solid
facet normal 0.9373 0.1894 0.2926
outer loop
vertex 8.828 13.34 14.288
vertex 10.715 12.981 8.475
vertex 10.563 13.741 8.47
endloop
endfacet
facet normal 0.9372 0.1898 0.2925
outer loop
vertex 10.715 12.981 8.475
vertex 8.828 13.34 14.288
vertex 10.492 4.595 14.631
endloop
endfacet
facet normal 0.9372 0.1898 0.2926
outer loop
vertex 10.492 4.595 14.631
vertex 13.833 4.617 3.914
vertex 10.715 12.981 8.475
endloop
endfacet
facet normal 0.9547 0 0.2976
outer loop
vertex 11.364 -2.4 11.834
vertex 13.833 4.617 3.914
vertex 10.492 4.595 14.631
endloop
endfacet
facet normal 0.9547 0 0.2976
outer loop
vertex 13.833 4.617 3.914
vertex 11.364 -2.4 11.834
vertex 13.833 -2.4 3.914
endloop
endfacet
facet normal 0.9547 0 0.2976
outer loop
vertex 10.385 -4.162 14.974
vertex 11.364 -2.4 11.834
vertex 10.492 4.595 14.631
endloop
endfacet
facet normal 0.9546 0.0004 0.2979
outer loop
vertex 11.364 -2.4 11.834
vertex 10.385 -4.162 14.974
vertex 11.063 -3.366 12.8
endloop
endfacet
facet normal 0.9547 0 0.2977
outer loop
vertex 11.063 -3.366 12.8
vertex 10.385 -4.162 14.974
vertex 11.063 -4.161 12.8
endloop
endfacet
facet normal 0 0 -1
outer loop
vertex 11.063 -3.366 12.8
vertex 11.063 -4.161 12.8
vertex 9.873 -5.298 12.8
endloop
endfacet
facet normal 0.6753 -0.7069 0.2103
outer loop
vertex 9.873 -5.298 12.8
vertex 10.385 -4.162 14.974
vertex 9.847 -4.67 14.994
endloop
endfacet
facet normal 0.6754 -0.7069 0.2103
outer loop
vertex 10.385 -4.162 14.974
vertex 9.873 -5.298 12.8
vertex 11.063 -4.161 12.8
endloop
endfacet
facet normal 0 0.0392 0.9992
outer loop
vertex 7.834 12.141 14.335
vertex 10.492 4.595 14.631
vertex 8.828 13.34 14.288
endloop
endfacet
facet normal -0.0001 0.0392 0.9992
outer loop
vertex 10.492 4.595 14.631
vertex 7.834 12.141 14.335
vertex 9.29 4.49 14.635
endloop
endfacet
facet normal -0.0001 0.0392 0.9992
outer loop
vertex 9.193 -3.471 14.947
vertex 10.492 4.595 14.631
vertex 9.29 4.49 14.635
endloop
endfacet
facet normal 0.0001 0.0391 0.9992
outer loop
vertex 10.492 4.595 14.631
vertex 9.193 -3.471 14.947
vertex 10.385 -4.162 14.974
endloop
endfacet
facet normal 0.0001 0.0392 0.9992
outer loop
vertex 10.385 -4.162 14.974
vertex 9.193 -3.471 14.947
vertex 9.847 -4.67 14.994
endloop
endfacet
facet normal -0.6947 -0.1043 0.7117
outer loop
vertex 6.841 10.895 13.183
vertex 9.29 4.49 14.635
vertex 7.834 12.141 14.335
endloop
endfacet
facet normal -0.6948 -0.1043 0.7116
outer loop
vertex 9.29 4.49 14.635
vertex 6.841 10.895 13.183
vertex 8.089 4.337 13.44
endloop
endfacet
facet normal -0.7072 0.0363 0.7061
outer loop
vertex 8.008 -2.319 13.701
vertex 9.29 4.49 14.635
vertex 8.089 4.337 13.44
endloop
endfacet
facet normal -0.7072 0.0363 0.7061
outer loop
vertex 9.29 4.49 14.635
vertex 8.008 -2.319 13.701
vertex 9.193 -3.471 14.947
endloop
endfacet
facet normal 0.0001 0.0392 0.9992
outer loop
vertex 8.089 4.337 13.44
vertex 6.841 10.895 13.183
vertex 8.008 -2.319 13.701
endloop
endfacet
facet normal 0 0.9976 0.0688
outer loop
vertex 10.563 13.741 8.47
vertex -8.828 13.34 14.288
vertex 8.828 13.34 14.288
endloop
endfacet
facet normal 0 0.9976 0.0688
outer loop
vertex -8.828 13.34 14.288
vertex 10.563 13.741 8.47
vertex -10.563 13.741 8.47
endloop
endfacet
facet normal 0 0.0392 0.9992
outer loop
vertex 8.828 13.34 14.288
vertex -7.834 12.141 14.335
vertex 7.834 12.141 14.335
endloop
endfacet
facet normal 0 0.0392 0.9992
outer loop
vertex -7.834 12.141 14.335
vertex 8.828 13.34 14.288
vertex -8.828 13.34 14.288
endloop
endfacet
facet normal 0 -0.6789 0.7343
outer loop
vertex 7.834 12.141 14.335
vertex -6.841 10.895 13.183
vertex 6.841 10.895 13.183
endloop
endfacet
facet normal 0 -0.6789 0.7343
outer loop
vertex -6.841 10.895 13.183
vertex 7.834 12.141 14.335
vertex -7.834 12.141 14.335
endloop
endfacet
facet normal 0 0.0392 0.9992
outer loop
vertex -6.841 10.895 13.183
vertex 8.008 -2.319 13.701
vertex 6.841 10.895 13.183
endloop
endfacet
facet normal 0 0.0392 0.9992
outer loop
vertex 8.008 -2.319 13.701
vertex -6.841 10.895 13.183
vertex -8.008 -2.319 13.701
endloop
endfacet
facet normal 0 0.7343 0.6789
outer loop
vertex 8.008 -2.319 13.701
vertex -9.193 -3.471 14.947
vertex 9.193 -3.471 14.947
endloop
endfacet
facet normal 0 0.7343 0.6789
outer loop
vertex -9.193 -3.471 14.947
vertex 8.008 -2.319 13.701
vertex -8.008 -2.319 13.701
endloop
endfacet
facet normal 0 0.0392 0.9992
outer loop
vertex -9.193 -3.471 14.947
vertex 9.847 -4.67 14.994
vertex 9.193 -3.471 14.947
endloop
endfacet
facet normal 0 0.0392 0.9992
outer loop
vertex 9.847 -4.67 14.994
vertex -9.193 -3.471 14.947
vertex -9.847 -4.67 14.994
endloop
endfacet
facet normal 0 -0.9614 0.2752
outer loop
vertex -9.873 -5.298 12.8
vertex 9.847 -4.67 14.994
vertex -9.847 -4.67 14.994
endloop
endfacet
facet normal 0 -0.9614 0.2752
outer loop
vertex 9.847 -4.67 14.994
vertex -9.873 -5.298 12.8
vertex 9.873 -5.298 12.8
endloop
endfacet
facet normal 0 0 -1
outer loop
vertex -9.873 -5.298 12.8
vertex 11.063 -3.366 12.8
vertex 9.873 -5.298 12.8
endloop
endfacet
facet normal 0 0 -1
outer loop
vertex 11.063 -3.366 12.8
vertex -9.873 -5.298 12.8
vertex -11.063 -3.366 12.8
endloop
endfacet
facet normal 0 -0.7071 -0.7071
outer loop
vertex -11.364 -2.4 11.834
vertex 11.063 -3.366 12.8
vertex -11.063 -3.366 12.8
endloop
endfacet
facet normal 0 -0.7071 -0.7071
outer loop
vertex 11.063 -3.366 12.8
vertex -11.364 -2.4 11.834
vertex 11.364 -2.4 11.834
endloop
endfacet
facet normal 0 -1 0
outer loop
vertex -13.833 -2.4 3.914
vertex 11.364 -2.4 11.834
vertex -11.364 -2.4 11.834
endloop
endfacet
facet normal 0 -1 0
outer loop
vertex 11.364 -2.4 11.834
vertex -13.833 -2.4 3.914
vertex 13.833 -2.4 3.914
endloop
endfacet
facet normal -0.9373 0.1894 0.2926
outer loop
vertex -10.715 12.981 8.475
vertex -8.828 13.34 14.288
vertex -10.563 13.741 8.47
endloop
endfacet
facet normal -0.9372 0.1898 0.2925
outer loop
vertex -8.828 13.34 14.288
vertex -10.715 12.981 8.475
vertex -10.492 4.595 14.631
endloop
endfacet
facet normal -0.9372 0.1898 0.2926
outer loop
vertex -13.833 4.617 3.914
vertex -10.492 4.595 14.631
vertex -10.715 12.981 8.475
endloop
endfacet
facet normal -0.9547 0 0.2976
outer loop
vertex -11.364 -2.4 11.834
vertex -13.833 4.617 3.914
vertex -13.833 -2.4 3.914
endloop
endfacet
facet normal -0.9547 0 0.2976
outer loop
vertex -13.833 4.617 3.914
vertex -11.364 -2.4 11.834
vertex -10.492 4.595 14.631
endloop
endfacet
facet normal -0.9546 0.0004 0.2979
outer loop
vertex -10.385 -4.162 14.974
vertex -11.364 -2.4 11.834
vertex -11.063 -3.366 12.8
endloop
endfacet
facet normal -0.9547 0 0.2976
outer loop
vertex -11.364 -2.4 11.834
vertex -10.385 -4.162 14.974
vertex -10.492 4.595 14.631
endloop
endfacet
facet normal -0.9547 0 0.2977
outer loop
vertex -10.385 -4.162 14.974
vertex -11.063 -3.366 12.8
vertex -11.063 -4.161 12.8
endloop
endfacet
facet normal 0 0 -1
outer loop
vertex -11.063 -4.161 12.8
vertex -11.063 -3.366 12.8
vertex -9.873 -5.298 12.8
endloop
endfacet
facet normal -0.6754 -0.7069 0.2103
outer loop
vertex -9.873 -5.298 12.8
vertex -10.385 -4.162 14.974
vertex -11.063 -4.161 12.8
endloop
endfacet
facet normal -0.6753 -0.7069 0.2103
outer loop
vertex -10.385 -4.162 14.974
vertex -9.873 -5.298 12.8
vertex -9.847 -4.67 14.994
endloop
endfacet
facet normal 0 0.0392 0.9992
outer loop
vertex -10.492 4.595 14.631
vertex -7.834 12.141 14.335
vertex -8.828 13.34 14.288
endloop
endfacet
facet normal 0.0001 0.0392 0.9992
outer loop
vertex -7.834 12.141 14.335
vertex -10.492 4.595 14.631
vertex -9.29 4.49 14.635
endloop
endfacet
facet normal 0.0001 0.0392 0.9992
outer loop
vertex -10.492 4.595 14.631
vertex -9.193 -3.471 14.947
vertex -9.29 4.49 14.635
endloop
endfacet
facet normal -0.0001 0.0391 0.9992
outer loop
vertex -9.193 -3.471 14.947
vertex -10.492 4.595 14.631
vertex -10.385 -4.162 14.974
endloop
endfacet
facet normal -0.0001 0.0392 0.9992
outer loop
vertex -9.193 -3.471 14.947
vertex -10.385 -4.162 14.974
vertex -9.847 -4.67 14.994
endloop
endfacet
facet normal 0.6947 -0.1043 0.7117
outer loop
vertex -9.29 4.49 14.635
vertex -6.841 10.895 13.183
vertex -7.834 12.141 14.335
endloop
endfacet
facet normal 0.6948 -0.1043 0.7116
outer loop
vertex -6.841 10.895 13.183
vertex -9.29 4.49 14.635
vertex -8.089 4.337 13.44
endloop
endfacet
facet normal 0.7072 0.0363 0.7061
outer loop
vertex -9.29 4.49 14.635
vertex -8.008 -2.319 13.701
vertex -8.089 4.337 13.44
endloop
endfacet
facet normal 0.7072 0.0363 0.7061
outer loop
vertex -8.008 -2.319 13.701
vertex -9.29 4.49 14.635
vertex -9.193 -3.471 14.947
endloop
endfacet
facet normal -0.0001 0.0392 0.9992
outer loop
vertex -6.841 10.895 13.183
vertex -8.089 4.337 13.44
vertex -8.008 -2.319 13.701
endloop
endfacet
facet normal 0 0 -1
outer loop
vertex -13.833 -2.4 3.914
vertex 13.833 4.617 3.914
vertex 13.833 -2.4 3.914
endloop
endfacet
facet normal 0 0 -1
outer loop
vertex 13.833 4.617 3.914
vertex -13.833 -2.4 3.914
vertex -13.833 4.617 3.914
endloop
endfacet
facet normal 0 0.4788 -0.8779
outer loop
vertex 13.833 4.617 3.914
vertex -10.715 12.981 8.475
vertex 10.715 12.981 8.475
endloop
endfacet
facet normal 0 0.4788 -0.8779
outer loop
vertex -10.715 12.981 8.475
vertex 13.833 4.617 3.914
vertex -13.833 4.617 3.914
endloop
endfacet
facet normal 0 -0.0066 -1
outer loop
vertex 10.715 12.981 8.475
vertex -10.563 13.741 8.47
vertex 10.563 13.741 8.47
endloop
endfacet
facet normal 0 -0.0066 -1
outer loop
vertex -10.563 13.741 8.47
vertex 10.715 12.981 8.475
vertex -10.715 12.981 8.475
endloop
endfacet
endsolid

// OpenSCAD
use <../lib.scad>
function ldraw_lib__15435() = [
// 0 ~Minifig Helmet Large Square - Top
// 0 Name: 15435.dat
// 0 Author: Magnus Forsberg [MagFors]
// 0 !LDRAW_ORG Part UPDATE 2024-03
// 0 !LICENSE Licensed under CC BY 4.0 : see CAreadme.txt
// 
// 0 BFC CERTIFY CCW
  [0,"BFC","CERTIFY"],
  [0,"BFC","CCW"],
// 
// 0 !HISTORY 2024-04-28 [OrionP] Official Update 2024-03
// 
// 0 // side
// 4 16 26.2294 -36.577 11.4883 26.7885 -21.1873 32.4533 26.4076 -21.175 34.3532 22.0694 -35.72 33.35
  [4,16,26.2294,-36.577,11.4883,26.7885,-21.1873,32.4533,26.4076,-21.175,34.3532,22.0694,-35.72,33.35],
// 3 16 26.2294 -36.577 11.4883 34.5836 -9.785 11.5429 26.7885 -21.1873 32.4533
  [3,16,26.2294,-36.577,11.4883,34.5836,-9.785,11.5429,26.7885,-21.1873,32.4533],
// 4 16 26.2294 -36.577 11.4883 28.4096 -29.585 -6 34.5836 -9.785 -6 34.5836 -9.785 11.5429
  [4,16,26.2294,-36.577,11.4883,28.4096,-29.585,-6,34.5836,-9.785,-6,34.5836,-9.785,11.5429],
// 4 16 27.6566 -32 -8.415 28.4096 -29.585 -6 26.2294 -36.577 11.4883 25.9618 -37.4353 -10.4053
  [4,16,27.6566,-32,-8.415,28.4096,-29.585,-6,26.2294,-36.577,11.4883,25.9618,-37.4353,-10.4053],
// 3 16 27.6566 -32 -8.415 25.9618 -37.4353 -10.4053 27.6566 -32 -10.4017
  [3,16,27.6566,-32,-8.415,25.9618,-37.4353,-10.4053,27.6566,-32,-10.4017],
// 3 16 27.6566 -32 -8.415 27.6566 -32 -10.4017 24.6821 -32 -13.2454
  [3,16,27.6566,-32,-8.415,27.6566,-32,-10.4017,24.6821,-32,-13.2454],
// 4 16 25.9618 -37.4353 -10.4053 24.6181 -37.485 -11.675 24.6821 -32 -13.2454 27.6566 -32 -10.4017
  [4,16,25.9618,-37.4353,-10.4053,24.6181,-37.485,-11.675,24.6821,-32,-13.2454,27.6566,-32,-10.4017],
// 4 16 26.2294 -36.577 11.4883 22.0694 -35.72 33.35 19.5861 -35.8375 30.3523 23.2259 -36.5874 11.224
  [4,16,26.2294,-36.577,11.4883,22.0694,-35.72,33.35,19.5861,-35.8375,30.3523,23.2259,-36.5874,11.224],
// 4 16 26.2294 -36.577 11.4883 23.2259 -36.5874 11.224 22.9827 -37.3675 -8.6773 25.9618 -37.4353 -10.4053
  [4,16,26.2294,-36.577,11.4883,23.2259,-36.5874,11.224,22.9827,-37.3675,-8.6773,25.9618,-37.4353,-10.4053],
// 3 16 25.9618 -37.4353 -10.4053 22.9827 -37.3675 -8.6773 24.6181 -37.485 -11.675
  [3,16,25.9618,-37.4353,-10.4053,22.9827,-37.3675,-8.6773,24.6181,-37.485,-11.675],
// 4 16 20.2225 -33.6 10.8421 23.2259 -36.5874 11.224 19.5861 -35.8375 30.3523 17.1027 -32.9574 27.2371
  [4,16,20.2225,-33.6,10.8421,23.2259,-36.5874,11.224,19.5861,-35.8375,30.3523,17.1027,-32.9574,27.2371],
// 4 16 20.2225 -33.6 10.8421 20.0191 -34.2523 -5.7971 22.9827 -37.3675 -8.6773 23.2259 -36.5874 11.224
  [4,16,20.2225,-33.6,10.8421,20.0191,-34.2523,-5.7971,22.9827,-37.3675,-8.6773,23.2259,-36.5874,11.224],
// 3 16 20.2225 -33.6 10.8421 17.1027 -32.9574 27.2371 20.0191 -34.2523 -5.7971
  [3,16,20.2225,-33.6,10.8421,17.1027,-32.9574,27.2371,20.0191,-34.2523,-5.7971],
// 0 // Edges
// 2 24 26.4076 -21.175 34.3532 22.0694 -35.72 33.35
  [2,24,26.4076,-21.175,34.3532,22.0694,-35.72,33.35],
// 2 24 26.2294 -36.577 11.4883 34.5836 -9.785 11.5429
  [2,24,26.2294,-36.577,11.4883,34.5836,-9.785,11.5429],
// 2 24 34.5836 -9.785 -6 28.4096 -29.585 -6
  [2,24,34.5836,-9.785,-6,28.4096,-29.585,-6],
// 2 24 28.4096 -29.585 -6 27.6566 -32 -8.415
  [2,24,28.4096,-29.585,-6,27.6566,-32,-8.415],
// 2 24 27.6566 -32 -8.415 27.6566 -32 -10.4017
  [2,24,27.6566,-32,-8.415,27.6566,-32,-10.4017],
// 2 24 27.6566 -32 -10.4017 24.6821 -32 -13.2454
  [2,24,27.6566,-32,-10.4017,24.6821,-32,-13.2454],
// 2 24 27.6566 -32 -10.4017 25.9618 -37.4353 -10.4053
  [2,24,27.6566,-32,-10.4017,25.9618,-37.4353,-10.4053],
// 2 24 24.6821 -32 -13.2454 24.6181 -37.485 -11.675
  [2,24,24.6821,-32,-13.2454,24.6181,-37.485,-11.675],
// 2 24 24.6181 -37.485 -11.675 25.9618 -37.4353 -10.4053
  [2,24,24.6181,-37.485,-11.675,25.9618,-37.4353,-10.4053],
// 2 24 17.1027 -32.9574 27.2371 20.2225 -33.6 10.8421
  [2,24,17.1027,-32.9574,27.2371,20.2225,-33.6,10.8421],
// 2 24 20.2225 -33.6 10.8421 20.0191 -34.2523 -5.7971
  [2,24,20.2225,-33.6,10.8421,20.0191,-34.2523,-5.7971],
// 2 24 17.1027 -32.9574 27.2371 19.5861 -35.8375 30.3523
  [2,24,17.1027,-32.9574,27.2371,19.5861,-35.8375,30.3523],
// 2 24 23.2259 -36.5874 11.224 20.2225 -33.6 10.8421
  [2,24,23.2259,-36.5874,11.224,20.2225,-33.6,10.8421],
// 2 24 20.0191 -34.2523 -5.7971 22.9827 -37.3675 -8.6773
  [2,24,20.0191,-34.2523,-5.7971,22.9827,-37.3675,-8.6773],
// 2 24 19.5861 -35.8375 30.3523 23.2259 -36.5874 11.224
  [2,24,19.5861,-35.8375,30.3523,23.2259,-36.5874,11.224],
// 2 24 23.2259 -36.5874 11.224 22.9827 -37.3675 -8.6773
  [2,24,23.2259,-36.5874,11.224,22.9827,-37.3675,-8.6773],
// 2 24 22.0694 -35.72 33.35 26.2294 -36.577 11.4883
  [2,24,22.0694,-35.72,33.35,26.2294,-36.577,11.4883],
// 2 24 26.2294 -36.577 11.4883 25.9618 -37.4353 -10.4053
  [2,24,26.2294,-36.577,11.4883,25.9618,-37.4353,-10.4053],
// 2 24 26.4076 -21.175 34.3532 26.7885 -21.1873 32.4533
  [2,24,26.4076,-21.175,34.3532,26.7885,-21.1873,32.4533],
// 2 24 26.7885 -21.1873 32.4533 34.5836 -9.785 11.5429
  [2,24,26.7885,-21.1873,32.4533,34.5836,-9.785,11.5429],
// 2 24 34.5836 -9.785 11.5429 34.5836 -9.785 -6
  [2,24,34.5836,-9.785,11.5429,34.5836,-9.785,-6],
// 
// 0 // middle
// 4 16 -22.0694 -35.72 33.35 22.0694 -35.72 33.35 26.4076 -21.175 34.3532 -26.4076 -21.175 34.3532
  [4,16,-22.0694,-35.72,33.35,22.0694,-35.72,33.35,26.4076,-21.175,34.3532,-26.4076,-21.175,34.3532],
// 4 16 -19.5861 -35.8375 30.3523 19.5861 -35.8375 30.3523 22.0694 -35.72 33.35 -22.0694 -35.72 33.35
  [4,16,-19.5861,-35.8375,30.3523,19.5861,-35.8375,30.3523,22.0694,-35.72,33.35,-22.0694,-35.72,33.35],
// 4 16 -19.5861 -35.8375 30.3523 -17.1027 -32.9574 27.2371 17.1027 -32.9574 27.2371 19.5861 -35.8375 30.3523
  [4,16,-19.5861,-35.8375,30.3523,-17.1027,-32.9574,27.2371,17.1027,-32.9574,27.2371,19.5861,-35.8375,30.3523],
// 4 16 -20.0191 -34.2523 -5.7971 20.0191 -34.2523 -5.7971 17.1027 -32.9574 27.2371 -17.1027 -32.9574 27.2371
  [4,16,-20.0191,-34.2523,-5.7971,20.0191,-34.2523,-5.7971,17.1027,-32.9574,27.2371,-17.1027,-32.9574,27.2371],
// 4 16 -20.0191 -34.2523 -5.7971 -22.9827 -37.3675 -8.6773 22.9827 -37.3675 -8.6773 20.0191 -34.2523 -5.7971
  [4,16,-20.0191,-34.2523,-5.7971,-22.9827,-37.3675,-8.6773,22.9827,-37.3675,-8.6773,20.0191,-34.2523,-5.7971],
// 4 16 -24.6181 -37.485 -11.675 24.6181 -37.485 -11.675 22.9827 -37.3675 -8.6773 -22.9827 -37.3675 -8.6773
  [4,16,-24.6181,-37.485,-11.675,24.6181,-37.485,-11.675,22.9827,-37.3675,-8.6773,-22.9827,-37.3675,-8.6773],
// 4 16 -24.6181 -37.485 -11.675 -24.6821 -32 -13.2454 24.6821 -32 -13.2454 24.6181 -37.485 -11.675
  [4,16,-24.6181,-37.485,-11.675,-24.6821,-32,-13.2454,24.6821,-32,-13.2454,24.6181,-37.485,-11.675],
// 4 16 -27.6566 -32 -8.415 27.6566 -32 -8.415 24.6821 -32 -13.2454 -24.6821 -32 -13.2454
  [4,16,-27.6566,-32,-8.415,27.6566,-32,-8.415,24.6821,-32,-13.2454,-24.6821,-32,-13.2454],
// 4 16 -27.6566 -32 -8.415 -28.4096 -29.585 -6 28.4096 -29.585 -6 27.6566 -32 -8.415
  [4,16,-27.6566,-32,-8.415,-28.4096,-29.585,-6,28.4096,-29.585,-6,27.6566,-32,-8.415],
// 4 16 -34.5836 -9.785 -6 34.5836 -9.785 -6 28.4096 -29.585 -6 -28.4096 -29.585 -6
  [4,16,-34.5836,-9.785,-6,34.5836,-9.785,-6,28.4096,-29.585,-6,-28.4096,-29.585,-6],
// 2 24 -22.0694 -35.72 33.35 22.0694 -35.72 33.35
  [2,24,-22.0694,-35.72,33.35,22.0694,-35.72,33.35],
// 2 24 -19.5861 -35.8375 30.3523 19.5861 -35.8375 30.3523
  [2,24,-19.5861,-35.8375,30.3523,19.5861,-35.8375,30.3523],
// 2 24 -17.1027 -32.9574 27.2371 17.1027 -32.9574 27.2371
  [2,24,-17.1027,-32.9574,27.2371,17.1027,-32.9574,27.2371],
// 2 24 -20.0191 -34.2523 -5.7971 20.0191 -34.2523 -5.7971
  [2,24,-20.0191,-34.2523,-5.7971,20.0191,-34.2523,-5.7971],
// 2 24 -22.9827 -37.3675 -8.6773 22.9827 -37.3675 -8.6773
  [2,24,-22.9827,-37.3675,-8.6773,22.9827,-37.3675,-8.6773],
// 2 24 -24.6181 -37.485 -11.675 24.6181 -37.485 -11.675
  [2,24,-24.6181,-37.485,-11.675,24.6181,-37.485,-11.675],
// 2 24 -24.6821 -32 -13.2454 24.6821 -32 -13.2454
  [2,24,-24.6821,-32,-13.2454,24.6821,-32,-13.2454],
// 2 24 -27.6566 -32 -8.415 27.6566 -32 -8.415
  [2,24,-27.6566,-32,-8.415,27.6566,-32,-8.415],
// 2 24 -28.4096 -29.585 -6 28.4096 -29.585 -6
  [2,24,-28.4096,-29.585,-6,28.4096,-29.585,-6],
// 2 24 -26.4076 -21.175 34.3532 26.4076 -21.175 34.3532
  [2,24,-26.4076,-21.175,34.3532,26.4076,-21.175,34.3532],
// 2 24 -34.5836 -9.785 -6 34.5836 -9.785 -6
  [2,24,-34.5836,-9.785,-6,34.5836,-9.785,-6],
// 
// 0 // side
// 4 16 -26.4076 -21.175 34.3532 -26.7885 -21.1873 32.4533 -26.2294 -36.577 11.4883 -22.0694 -35.72 33.35
  [4,16,-26.4076,-21.175,34.3532,-26.7885,-21.1873,32.4533,-26.2294,-36.577,11.4883,-22.0694,-35.72,33.35],
// 3 16 -34.5836 -9.785 11.5429 -26.2294 -36.577 11.4883 -26.7885 -21.1873 32.4533
  [3,16,-34.5836,-9.785,11.5429,-26.2294,-36.577,11.4883,-26.7885,-21.1873,32.4533],
// 4 16 -34.5836 -9.785 -6 -28.4096 -29.585 -6 -26.2294 -36.577 11.4883 -34.5836 -9.785 11.5429
  [4,16,-34.5836,-9.785,-6,-28.4096,-29.585,-6,-26.2294,-36.577,11.4883,-34.5836,-9.785,11.5429],
// 4 16 -26.2294 -36.577 11.4883 -28.4096 -29.585 -6 -27.6566 -32 -8.415 -25.9618 -37.4353 -10.4053
  [4,16,-26.2294,-36.577,11.4883,-28.4096,-29.585,-6,-27.6566,-32,-8.415,-25.9618,-37.4353,-10.4053],
// 3 16 -25.9618 -37.4353 -10.4053 -27.6566 -32 -8.415 -27.6566 -32 -10.4017
  [3,16,-25.9618,-37.4353,-10.4053,-27.6566,-32,-8.415,-27.6566,-32,-10.4017],
// 3 16 -27.6566 -32 -10.4017 -27.6566 -32 -8.415 -24.6821 -32 -13.2454
  [3,16,-27.6566,-32,-10.4017,-27.6566,-32,-8.415,-24.6821,-32,-13.2454],
// 4 16 -24.6821 -32 -13.2454 -24.6181 -37.485 -11.675 -25.9618 -37.4353 -10.4053 -27.6566 -32 -10.4017
  [4,16,-24.6821,-32,-13.2454,-24.6181,-37.485,-11.675,-25.9618,-37.4353,-10.4053,-27.6566,-32,-10.4017],
// 4 16 -19.5861 -35.8375 30.3523 -22.0694 -35.72 33.35 -26.2294 -36.577 11.4883 -23.2259 -36.5874 11.224
  [4,16,-19.5861,-35.8375,30.3523,-22.0694,-35.72,33.35,-26.2294,-36.577,11.4883,-23.2259,-36.5874,11.224],
// 4 16 -22.9827 -37.3675 -8.6773 -23.2259 -36.5874 11.224 -26.2294 -36.577 11.4883 -25.9618 -37.4353 -10.4053
  [4,16,-22.9827,-37.3675,-8.6773,-23.2259,-36.5874,11.224,-26.2294,-36.577,11.4883,-25.9618,-37.4353,-10.4053],
// 3 16 -22.9827 -37.3675 -8.6773 -25.9618 -37.4353 -10.4053 -24.6181 -37.485 -11.675
  [3,16,-22.9827,-37.3675,-8.6773,-25.9618,-37.4353,-10.4053,-24.6181,-37.485,-11.675],
// 4 16 -19.5861 -35.8375 30.3523 -23.2259 -36.5874 11.224 -20.2225 -33.6 10.8421 -17.1027 -32.9574 27.2371
  [4,16,-19.5861,-35.8375,30.3523,-23.2259,-36.5874,11.224,-20.2225,-33.6,10.8421,-17.1027,-32.9574,27.2371],
// 4 16 -22.9827 -37.3675 -8.6773 -20.0191 -34.2523 -5.7971 -20.2225 -33.6 10.8421 -23.2259 -36.5874 11.224
  [4,16,-22.9827,-37.3675,-8.6773,-20.0191,-34.2523,-5.7971,-20.2225,-33.6,10.8421,-23.2259,-36.5874,11.224],
// 3 16 -17.1027 -32.9574 27.2371 -20.2225 -33.6 10.8421 -20.0191 -34.2523 -5.7971
  [3,16,-17.1027,-32.9574,27.2371,-20.2225,-33.6,10.8421,-20.0191,-34.2523,-5.7971],
// 0 // Edges
// 2 24 -22.0694 -35.72 33.35 -26.4076 -21.175 34.3532
  [2,24,-22.0694,-35.72,33.35,-26.4076,-21.175,34.3532],
// 2 24 -34.5836 -9.785 11.5429 -26.2294 -36.577 11.4883
  [2,24,-34.5836,-9.785,11.5429,-26.2294,-36.577,11.4883],
// 2 24 -28.4096 -29.585 -6 -34.5836 -9.785 -6
  [2,24,-28.4096,-29.585,-6,-34.5836,-9.785,-6],
// 2 24 -27.6566 -32 -8.415 -28.4096 -29.585 -6
  [2,24,-27.6566,-32,-8.415,-28.4096,-29.585,-6],
// 2 24 -27.6566 -32 -10.4017 -27.6566 -32 -8.415
  [2,24,-27.6566,-32,-10.4017,-27.6566,-32,-8.415],
// 2 24 -24.6821 -32 -13.2454 -27.6566 -32 -10.4017
  [2,24,-24.6821,-32,-13.2454,-27.6566,-32,-10.4017],
// 2 24 -25.9618 -37.4353 -10.4053 -27.6566 -32 -10.4017
  [2,24,-25.9618,-37.4353,-10.4053,-27.6566,-32,-10.4017],
// 2 24 -24.6181 -37.485 -11.675 -24.6821 -32 -13.2454
  [2,24,-24.6181,-37.485,-11.675,-24.6821,-32,-13.2454],
// 2 24 -25.9618 -37.4353 -10.4053 -24.6181 -37.485 -11.675
  [2,24,-25.9618,-37.4353,-10.4053,-24.6181,-37.485,-11.675],
// 2 24 -20.2225 -33.6 10.8421 -17.1027 -32.9574 27.2371
  [2,24,-20.2225,-33.6,10.8421,-17.1027,-32.9574,27.2371],
// 2 24 -20.0191 -34.2523 -5.7971 -20.2225 -33.6 10.8421
  [2,24,-20.0191,-34.2523,-5.7971,-20.2225,-33.6,10.8421],
// 2 24 -19.5861 -35.8375 30.3523 -17.1027 -32.9574 27.2371
  [2,24,-19.5861,-35.8375,30.3523,-17.1027,-32.9574,27.2371],
// 2 24 -20.2225 -33.6 10.8421 -23.2259 -36.5874 11.224
  [2,24,-20.2225,-33.6,10.8421,-23.2259,-36.5874,11.224],
// 2 24 -22.9827 -37.3675 -8.6773 -20.0191 -34.2523 -5.7971
  [2,24,-22.9827,-37.3675,-8.6773,-20.0191,-34.2523,-5.7971],
// 2 24 -23.2259 -36.5874 11.224 -19.5861 -35.8375 30.3523
  [2,24,-23.2259,-36.5874,11.224,-19.5861,-35.8375,30.3523],
// 2 24 -22.9827 -37.3675 -8.6773 -23.2259 -36.5874 11.224
  [2,24,-22.9827,-37.3675,-8.6773,-23.2259,-36.5874,11.224],
// 2 24 -26.2294 -36.577 11.4883 -22.0694 -35.72 33.35
  [2,24,-26.2294,-36.577,11.4883,-22.0694,-35.72,33.35],
// 2 24 -25.9618 -37.4353 -10.4053 -26.2294 -36.577 11.4883
  [2,24,-25.9618,-37.4353,-10.4053,-26.2294,-36.577,11.4883],
// 2 24 -26.7885 -21.1873 32.4533 -26.4076 -21.175 34.3532
  [2,24,-26.7885,-21.1873,32.4533,-26.4076,-21.175,34.3532],
// 2 24 -34.5836 -9.785 11.5429 -26.7885 -21.1873 32.4533
  [2,24,-34.5836,-9.785,11.5429,-26.7885,-21.1873,32.4533],
// 2 24 -34.5836 -9.785 -6 -34.5836 -9.785 11.5429
  [2,24,-34.5836,-9.785,-6,-34.5836,-9.785,11.5429],
// 
// 0 // closed inside
// 4 16 34.5836 -9.785 -6 -34.5836 -9.785 -6 -34.5836 -9.785 11.5429 34.5836 -9.785 11.5429
  [4,16,34.5836,-9.785,-6,-34.5836,-9.785,-6,-34.5836,-9.785,11.5429,34.5836,-9.785,11.5429],
// 4 16 26.7885 -21.1873 32.4533 34.5836 -9.785 11.5429 -34.5836 -9.785 11.5429 -26.7885 -21.1873 32.4533
  [4,16,26.7885,-21.1873,32.4533,34.5836,-9.785,11.5429,-34.5836,-9.785,11.5429,-26.7885,-21.1873,32.4533],
// 4 16 26.7885 -21.1873 32.4533 -26.7885 -21.1873 32.4533 -26.4076 -21.175 34.3532 26.4076 -21.175 34.3532
  [4,16,26.7885,-21.1873,32.4533,-26.7885,-21.1873,32.4533,-26.4076,-21.175,34.3532,26.4076,-21.175,34.3532],
// 2 24 -34.5836 -9.785 11.5429 34.5836 -9.785 11.5429
  [2,24,-34.5836,-9.785,11.5429,34.5836,-9.785,11.5429],
// 2 24 -26.7885 -21.1873 32.4533 26.7885 -21.1873 32.4533
  [2,24,-26.7885,-21.1873,32.4533,26.7885,-21.1873,32.4533],
];
module ldraw_lib__15435(step=0, col=false, unit=2/5, alt=false, line=0.2, solid=!$preview)
    makepoly(ldraw_lib__15435(), step=step, col=col, unit=unit, alt=alt, line=line, solid=solid);
ldraw_lib__15435(line=0.2);
